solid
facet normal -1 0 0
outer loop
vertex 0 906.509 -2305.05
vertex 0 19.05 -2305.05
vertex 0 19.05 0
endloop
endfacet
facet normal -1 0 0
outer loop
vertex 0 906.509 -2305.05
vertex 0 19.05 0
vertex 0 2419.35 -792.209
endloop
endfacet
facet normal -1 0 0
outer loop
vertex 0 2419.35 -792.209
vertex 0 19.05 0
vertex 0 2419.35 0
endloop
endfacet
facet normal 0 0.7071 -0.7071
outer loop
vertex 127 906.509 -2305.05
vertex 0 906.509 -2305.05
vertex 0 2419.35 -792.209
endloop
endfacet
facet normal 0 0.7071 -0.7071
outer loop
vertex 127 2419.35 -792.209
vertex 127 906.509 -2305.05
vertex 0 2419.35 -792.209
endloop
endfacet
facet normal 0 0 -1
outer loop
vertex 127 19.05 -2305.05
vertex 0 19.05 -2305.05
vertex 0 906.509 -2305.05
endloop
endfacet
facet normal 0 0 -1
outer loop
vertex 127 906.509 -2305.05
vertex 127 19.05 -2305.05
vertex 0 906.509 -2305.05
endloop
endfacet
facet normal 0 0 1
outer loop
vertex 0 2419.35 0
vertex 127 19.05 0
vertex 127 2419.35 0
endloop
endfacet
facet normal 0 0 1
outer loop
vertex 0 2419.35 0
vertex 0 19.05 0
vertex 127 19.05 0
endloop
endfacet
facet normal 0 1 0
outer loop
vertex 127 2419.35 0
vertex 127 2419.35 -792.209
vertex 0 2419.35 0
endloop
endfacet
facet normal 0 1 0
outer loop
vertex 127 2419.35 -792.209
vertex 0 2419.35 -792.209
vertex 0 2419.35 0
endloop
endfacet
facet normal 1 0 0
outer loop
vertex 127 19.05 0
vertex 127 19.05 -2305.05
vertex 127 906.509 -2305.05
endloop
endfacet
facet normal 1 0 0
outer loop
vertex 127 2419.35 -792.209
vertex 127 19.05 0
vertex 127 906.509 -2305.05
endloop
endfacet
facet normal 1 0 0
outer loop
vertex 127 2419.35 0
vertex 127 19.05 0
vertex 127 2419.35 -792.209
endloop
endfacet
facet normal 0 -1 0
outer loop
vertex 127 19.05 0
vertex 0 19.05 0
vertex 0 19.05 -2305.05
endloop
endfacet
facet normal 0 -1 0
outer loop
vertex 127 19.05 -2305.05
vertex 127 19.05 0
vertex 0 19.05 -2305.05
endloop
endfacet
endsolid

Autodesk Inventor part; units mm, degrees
ref_plane "YZ Plane" through (0, 0, 0) normal (1, 0, 0) x (0, 1, 0)
ref_plane "XZ Plane" through (0, 0, 0) normal (0, 1, 0) x (-1, 0, 0)
ref_plane "XY Plane" through (0, 0, 0) normal (0, 0, 1) x (1, 0, 0)
sketch "Sketch1" plane through (0, 0, 0) normal (1, 0, 0) x (0, 1, 0)
  line L0 (0, 0) -> (2438.4, 0)
  line L1 (2438.4, 0) -> (2438.4, -800.1)
  line L2 (2438.4, -800.1) -> (914.4, -2324.1)
  line L3 (914.4, -2324.1) -> (0, -2324.1)
  line L4 (0, -2324.1) -> (0, 0)
  line L5 (2419.35, -792.2092) -> (2419.35, 0)
  line L6 (19.05, 0) -> (19.05, -2305.05)
  line L7 (19.05, -2305.05) -> (906.5092, -2305.05)
  line L8 (906.5092, -2305.05) -> (2419.35, -792.2092)
  dimension "d0" = 2324.1
  dimension "d1" = 2438.4
  dimension "d2" = 914.4
  dimension "d3" = 135
  dimension "d6" = 19.05
  dimension "d7" = 19.05
  dimension "d8" = 19.05
extrude "Extrusion1" add sketch "Sketch1" along normal blind 127 contours L0 L5 L8 L7 L6
properties part number "Wall_Between_Attic_Room_And_Stairwell" material "Wood (Southern Pine)"
